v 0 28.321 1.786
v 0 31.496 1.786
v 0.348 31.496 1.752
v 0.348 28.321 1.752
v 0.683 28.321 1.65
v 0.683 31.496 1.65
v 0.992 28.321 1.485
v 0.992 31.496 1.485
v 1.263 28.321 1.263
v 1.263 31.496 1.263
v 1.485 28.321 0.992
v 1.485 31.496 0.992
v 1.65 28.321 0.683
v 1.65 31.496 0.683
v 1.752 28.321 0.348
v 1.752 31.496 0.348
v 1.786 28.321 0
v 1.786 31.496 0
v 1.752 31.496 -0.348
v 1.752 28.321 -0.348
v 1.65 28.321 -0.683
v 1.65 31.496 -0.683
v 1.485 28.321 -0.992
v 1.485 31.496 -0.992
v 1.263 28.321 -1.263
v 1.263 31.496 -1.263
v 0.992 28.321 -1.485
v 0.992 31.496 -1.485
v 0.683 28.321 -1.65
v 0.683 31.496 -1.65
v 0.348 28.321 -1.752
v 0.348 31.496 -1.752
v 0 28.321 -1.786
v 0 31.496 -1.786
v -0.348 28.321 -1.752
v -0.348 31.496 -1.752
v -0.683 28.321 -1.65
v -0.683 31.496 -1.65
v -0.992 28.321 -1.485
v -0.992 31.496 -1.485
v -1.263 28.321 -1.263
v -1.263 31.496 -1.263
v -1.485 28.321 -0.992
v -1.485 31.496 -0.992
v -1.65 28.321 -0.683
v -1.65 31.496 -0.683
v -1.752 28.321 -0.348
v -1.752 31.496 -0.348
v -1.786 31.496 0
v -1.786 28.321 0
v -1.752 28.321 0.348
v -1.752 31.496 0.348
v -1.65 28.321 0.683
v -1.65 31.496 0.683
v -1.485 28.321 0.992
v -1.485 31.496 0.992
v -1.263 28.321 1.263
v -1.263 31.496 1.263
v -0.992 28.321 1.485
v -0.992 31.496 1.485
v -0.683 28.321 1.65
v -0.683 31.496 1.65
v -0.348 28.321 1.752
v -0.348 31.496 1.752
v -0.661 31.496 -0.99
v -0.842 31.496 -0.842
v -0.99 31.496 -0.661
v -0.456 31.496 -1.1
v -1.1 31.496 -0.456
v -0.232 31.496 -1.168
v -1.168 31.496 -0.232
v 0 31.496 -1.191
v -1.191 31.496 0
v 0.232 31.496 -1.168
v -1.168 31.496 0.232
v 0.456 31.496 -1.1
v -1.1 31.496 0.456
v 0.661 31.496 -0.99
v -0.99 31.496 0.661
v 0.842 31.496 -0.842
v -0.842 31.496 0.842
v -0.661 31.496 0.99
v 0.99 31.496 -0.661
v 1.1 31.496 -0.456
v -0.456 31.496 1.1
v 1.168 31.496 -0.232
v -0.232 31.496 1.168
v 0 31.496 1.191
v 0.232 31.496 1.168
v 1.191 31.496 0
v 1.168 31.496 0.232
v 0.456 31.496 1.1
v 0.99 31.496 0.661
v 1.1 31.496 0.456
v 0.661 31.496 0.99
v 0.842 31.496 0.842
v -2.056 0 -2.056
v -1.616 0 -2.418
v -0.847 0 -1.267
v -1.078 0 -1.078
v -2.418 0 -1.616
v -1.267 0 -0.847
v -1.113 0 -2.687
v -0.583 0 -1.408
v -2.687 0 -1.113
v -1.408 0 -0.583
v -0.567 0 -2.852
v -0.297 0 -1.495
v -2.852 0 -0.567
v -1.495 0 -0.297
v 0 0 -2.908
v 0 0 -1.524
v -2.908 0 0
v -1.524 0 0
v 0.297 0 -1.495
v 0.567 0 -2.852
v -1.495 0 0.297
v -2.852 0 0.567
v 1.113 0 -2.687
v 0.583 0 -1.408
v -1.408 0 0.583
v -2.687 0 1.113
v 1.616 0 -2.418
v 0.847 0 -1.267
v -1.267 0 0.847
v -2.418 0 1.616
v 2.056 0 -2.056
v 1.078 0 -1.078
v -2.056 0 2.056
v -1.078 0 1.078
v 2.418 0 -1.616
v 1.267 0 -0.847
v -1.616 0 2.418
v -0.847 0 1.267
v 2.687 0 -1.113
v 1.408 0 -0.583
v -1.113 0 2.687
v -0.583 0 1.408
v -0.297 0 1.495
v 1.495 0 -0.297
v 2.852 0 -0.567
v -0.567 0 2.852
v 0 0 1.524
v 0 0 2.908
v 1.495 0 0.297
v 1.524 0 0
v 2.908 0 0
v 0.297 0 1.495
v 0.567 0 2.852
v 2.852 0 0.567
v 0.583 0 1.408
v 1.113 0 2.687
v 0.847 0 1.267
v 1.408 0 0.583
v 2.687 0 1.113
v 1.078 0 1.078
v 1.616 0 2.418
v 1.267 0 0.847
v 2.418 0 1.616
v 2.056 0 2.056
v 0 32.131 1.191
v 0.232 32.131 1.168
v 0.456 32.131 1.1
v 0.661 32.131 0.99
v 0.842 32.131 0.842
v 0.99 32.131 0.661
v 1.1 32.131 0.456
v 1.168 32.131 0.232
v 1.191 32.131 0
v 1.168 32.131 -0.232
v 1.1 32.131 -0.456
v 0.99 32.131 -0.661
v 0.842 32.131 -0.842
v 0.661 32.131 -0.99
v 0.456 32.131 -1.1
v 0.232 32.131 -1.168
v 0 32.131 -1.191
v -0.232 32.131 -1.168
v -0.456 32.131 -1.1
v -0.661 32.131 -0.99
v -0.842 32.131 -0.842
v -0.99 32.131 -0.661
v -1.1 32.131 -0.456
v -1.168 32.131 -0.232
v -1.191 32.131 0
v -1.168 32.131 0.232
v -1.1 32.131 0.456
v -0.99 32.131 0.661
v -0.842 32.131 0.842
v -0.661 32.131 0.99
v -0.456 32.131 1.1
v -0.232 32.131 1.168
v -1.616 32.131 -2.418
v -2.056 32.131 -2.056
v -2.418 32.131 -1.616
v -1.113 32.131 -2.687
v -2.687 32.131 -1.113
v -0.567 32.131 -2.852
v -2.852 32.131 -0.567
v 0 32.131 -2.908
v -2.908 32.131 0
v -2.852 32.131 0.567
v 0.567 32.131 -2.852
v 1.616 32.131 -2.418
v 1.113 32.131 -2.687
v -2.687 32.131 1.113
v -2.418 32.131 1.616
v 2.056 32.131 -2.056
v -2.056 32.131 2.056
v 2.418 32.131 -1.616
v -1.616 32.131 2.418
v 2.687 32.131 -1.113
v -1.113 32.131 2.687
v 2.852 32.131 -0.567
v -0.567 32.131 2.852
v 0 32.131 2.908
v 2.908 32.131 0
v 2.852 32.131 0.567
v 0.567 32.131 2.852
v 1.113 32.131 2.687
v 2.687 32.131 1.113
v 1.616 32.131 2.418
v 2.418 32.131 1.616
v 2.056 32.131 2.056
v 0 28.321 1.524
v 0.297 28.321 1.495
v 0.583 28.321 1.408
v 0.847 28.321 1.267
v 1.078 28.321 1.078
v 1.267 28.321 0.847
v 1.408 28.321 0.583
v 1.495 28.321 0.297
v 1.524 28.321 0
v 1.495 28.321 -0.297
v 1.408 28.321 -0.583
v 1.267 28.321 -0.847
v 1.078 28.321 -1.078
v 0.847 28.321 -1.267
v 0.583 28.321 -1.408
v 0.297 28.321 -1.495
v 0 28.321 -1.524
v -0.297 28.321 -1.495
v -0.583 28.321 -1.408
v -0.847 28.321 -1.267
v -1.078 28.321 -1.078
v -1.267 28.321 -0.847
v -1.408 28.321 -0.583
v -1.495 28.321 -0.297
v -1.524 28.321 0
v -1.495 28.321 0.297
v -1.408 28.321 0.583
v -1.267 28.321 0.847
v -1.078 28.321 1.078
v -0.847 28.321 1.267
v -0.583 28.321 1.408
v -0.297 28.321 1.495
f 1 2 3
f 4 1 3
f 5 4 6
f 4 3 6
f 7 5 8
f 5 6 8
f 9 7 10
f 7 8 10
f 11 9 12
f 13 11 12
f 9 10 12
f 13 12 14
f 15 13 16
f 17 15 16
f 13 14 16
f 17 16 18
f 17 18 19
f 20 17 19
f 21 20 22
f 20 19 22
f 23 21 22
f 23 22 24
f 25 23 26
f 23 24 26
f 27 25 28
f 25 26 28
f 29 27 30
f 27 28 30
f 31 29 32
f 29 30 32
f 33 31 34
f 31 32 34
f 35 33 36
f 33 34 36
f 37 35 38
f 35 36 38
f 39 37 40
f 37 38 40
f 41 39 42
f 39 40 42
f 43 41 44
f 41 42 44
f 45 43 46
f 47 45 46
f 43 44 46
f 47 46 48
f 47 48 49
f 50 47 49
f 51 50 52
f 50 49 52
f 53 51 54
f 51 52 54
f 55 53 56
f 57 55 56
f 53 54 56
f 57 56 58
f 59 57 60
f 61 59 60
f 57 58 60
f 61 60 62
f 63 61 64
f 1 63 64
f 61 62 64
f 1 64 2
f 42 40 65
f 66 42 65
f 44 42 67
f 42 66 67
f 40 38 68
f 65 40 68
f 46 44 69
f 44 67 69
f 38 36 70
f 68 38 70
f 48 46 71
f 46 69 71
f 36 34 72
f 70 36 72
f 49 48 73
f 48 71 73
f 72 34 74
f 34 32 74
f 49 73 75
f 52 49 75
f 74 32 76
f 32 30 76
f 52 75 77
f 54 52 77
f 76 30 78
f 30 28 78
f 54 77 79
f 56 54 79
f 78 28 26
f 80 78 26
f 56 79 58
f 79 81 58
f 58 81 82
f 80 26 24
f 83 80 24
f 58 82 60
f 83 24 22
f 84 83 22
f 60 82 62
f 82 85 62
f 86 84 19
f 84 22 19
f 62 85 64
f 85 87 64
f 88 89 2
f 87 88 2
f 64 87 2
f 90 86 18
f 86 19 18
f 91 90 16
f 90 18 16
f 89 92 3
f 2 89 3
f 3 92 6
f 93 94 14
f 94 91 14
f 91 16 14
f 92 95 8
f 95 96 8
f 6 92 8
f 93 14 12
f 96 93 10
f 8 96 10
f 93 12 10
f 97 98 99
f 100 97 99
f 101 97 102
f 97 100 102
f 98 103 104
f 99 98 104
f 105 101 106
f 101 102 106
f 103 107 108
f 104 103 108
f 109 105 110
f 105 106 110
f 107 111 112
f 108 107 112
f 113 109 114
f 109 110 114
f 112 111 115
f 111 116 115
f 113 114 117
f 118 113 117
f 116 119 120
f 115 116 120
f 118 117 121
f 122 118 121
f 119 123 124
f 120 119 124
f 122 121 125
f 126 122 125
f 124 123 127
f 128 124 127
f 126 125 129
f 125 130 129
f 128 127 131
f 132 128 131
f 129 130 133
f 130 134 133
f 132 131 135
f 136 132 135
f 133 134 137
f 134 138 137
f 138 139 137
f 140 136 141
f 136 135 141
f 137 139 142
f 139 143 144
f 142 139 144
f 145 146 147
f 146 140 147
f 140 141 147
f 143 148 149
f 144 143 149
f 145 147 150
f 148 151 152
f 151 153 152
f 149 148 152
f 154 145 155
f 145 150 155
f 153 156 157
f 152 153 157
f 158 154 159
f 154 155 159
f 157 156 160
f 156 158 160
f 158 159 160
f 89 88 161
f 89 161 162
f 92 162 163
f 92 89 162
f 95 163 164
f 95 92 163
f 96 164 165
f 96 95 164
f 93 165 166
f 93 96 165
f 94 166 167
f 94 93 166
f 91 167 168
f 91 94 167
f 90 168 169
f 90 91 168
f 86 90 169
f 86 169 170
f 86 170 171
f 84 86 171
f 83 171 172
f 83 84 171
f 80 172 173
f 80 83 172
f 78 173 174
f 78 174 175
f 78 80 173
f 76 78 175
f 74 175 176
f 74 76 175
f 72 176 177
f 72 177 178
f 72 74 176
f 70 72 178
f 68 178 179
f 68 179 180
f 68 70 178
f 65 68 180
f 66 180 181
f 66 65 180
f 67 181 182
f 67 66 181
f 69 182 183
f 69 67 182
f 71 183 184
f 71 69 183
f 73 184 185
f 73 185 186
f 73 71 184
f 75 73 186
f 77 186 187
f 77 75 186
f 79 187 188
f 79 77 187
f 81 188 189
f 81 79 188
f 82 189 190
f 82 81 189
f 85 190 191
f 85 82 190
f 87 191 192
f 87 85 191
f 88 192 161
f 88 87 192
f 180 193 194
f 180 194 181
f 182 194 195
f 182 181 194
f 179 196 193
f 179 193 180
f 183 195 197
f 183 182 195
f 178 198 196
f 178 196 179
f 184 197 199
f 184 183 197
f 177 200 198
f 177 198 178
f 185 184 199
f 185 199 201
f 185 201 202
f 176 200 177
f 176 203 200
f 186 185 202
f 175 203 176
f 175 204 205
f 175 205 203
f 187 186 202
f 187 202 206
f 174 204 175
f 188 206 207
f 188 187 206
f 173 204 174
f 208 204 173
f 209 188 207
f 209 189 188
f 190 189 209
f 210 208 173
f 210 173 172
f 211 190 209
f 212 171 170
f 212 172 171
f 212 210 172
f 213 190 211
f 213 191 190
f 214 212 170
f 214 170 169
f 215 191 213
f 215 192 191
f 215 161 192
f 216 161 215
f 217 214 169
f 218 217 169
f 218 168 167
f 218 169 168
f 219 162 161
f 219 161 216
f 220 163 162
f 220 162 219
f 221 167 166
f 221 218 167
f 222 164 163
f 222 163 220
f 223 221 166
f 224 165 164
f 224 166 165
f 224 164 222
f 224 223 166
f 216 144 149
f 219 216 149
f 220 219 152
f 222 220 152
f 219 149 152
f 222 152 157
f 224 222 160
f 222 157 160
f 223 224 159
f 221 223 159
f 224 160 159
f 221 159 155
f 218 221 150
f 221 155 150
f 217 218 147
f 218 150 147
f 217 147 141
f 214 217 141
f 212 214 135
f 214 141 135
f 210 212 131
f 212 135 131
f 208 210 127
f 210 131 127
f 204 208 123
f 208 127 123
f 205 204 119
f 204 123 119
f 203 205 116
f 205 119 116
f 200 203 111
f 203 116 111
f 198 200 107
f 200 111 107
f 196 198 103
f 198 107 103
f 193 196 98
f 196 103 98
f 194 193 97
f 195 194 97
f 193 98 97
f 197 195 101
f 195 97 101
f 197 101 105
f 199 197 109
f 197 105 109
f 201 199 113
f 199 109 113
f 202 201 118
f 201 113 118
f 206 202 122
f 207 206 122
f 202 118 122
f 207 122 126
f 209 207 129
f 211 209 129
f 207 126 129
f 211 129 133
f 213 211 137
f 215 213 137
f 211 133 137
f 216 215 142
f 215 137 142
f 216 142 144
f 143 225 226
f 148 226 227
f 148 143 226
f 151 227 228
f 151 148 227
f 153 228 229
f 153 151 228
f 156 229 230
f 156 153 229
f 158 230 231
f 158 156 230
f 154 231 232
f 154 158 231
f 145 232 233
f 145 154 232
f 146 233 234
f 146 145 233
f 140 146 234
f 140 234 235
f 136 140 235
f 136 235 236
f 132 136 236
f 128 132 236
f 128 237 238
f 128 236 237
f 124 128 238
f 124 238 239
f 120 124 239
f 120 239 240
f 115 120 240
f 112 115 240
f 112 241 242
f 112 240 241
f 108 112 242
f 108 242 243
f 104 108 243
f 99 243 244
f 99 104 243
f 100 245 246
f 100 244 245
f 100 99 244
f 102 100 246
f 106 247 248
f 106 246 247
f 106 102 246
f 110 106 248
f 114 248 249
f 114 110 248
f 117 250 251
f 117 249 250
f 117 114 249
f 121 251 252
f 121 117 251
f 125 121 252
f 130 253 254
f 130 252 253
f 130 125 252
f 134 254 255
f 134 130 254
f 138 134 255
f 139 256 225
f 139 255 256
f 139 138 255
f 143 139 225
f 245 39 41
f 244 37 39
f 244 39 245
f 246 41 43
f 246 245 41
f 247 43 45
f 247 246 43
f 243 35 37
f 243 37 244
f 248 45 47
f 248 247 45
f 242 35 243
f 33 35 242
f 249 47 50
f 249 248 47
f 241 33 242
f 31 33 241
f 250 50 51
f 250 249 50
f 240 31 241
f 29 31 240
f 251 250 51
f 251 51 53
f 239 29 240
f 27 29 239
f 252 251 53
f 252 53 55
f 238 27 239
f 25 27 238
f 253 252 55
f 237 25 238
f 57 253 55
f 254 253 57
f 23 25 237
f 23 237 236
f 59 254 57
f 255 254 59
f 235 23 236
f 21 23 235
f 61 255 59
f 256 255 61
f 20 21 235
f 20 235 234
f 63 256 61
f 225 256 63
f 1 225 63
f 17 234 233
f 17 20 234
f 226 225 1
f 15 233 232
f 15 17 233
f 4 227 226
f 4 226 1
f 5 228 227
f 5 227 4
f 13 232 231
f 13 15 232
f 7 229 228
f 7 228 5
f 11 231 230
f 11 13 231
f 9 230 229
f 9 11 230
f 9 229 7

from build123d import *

# Parameters (mm, degrees)
SKETCH1_R           = 2.9083
SKETCH1_R_2         = 1.524
BOSS_EXTRUDE1_DEPTH = 32.131
BOSS_EXTRUDE5_START = -0.635
SKETCH7_R           = 1.524
SKETCH7_R_2         = 1.190625
BOSS_EXTRUDE5_DEPTH = 0.635
SKETCH8_R           = 1.7859375
CUT_EXTRUDE2_DEPTH  = 3.175


with BuildPart() as part:
    # Sketch1 → Boss-Extrude1 (new body)
    with BuildSketch(Plane(origin=(0, 0, 0), x_dir=(1, 0, 0), z_dir=(0, 1, 0))):
        with Locations(Location((0, 0, 0), (0, 0, 270))):
            Circle(SKETCH1_R)
        with Locations(Location((0, 0, 0), (0, 0, 270))):
            Circle(SKETCH1_R_2, mode=Mode.SUBTRACT)
    extrude(amount=BOSS_EXTRUDE1_DEPTH)

    # Sketch7 → Boss-Extrude5 (add)
    with BuildSketch(Plane(origin=(0, 32.131, 0), x_dir=(1, 0, 0), z_dir=(0, 1, 0)).offset(BOSS_EXTRUDE5_START)):
        with Locations(Location((0, 0, 0), (0, 0, 270))):
            Circle(SKETCH7_R)
        with Locations(Location((0, 0, 0), (0, 0, 270))):
            Circle(SKETCH7_R_2, mode=Mode.SUBTRACT)
    extrude(amount=BOSS_EXTRUDE5_DEPTH)

    # Sketch8 → Cut-Extrude2 (cut)
    with BuildSketch(Plane(origin=(0, 31.496, 0), x_dir=(1, 0, 0), z_dir=(0, 1, 0))):
        with Locations(Location((0, 0, 0), (0, 0, 270))):
            Circle(SKETCH8_R)
    extrude(amount=-CUT_EXTRUDE2_DEPTH, mode=Mode.SUBTRACT)


solid = part.part
